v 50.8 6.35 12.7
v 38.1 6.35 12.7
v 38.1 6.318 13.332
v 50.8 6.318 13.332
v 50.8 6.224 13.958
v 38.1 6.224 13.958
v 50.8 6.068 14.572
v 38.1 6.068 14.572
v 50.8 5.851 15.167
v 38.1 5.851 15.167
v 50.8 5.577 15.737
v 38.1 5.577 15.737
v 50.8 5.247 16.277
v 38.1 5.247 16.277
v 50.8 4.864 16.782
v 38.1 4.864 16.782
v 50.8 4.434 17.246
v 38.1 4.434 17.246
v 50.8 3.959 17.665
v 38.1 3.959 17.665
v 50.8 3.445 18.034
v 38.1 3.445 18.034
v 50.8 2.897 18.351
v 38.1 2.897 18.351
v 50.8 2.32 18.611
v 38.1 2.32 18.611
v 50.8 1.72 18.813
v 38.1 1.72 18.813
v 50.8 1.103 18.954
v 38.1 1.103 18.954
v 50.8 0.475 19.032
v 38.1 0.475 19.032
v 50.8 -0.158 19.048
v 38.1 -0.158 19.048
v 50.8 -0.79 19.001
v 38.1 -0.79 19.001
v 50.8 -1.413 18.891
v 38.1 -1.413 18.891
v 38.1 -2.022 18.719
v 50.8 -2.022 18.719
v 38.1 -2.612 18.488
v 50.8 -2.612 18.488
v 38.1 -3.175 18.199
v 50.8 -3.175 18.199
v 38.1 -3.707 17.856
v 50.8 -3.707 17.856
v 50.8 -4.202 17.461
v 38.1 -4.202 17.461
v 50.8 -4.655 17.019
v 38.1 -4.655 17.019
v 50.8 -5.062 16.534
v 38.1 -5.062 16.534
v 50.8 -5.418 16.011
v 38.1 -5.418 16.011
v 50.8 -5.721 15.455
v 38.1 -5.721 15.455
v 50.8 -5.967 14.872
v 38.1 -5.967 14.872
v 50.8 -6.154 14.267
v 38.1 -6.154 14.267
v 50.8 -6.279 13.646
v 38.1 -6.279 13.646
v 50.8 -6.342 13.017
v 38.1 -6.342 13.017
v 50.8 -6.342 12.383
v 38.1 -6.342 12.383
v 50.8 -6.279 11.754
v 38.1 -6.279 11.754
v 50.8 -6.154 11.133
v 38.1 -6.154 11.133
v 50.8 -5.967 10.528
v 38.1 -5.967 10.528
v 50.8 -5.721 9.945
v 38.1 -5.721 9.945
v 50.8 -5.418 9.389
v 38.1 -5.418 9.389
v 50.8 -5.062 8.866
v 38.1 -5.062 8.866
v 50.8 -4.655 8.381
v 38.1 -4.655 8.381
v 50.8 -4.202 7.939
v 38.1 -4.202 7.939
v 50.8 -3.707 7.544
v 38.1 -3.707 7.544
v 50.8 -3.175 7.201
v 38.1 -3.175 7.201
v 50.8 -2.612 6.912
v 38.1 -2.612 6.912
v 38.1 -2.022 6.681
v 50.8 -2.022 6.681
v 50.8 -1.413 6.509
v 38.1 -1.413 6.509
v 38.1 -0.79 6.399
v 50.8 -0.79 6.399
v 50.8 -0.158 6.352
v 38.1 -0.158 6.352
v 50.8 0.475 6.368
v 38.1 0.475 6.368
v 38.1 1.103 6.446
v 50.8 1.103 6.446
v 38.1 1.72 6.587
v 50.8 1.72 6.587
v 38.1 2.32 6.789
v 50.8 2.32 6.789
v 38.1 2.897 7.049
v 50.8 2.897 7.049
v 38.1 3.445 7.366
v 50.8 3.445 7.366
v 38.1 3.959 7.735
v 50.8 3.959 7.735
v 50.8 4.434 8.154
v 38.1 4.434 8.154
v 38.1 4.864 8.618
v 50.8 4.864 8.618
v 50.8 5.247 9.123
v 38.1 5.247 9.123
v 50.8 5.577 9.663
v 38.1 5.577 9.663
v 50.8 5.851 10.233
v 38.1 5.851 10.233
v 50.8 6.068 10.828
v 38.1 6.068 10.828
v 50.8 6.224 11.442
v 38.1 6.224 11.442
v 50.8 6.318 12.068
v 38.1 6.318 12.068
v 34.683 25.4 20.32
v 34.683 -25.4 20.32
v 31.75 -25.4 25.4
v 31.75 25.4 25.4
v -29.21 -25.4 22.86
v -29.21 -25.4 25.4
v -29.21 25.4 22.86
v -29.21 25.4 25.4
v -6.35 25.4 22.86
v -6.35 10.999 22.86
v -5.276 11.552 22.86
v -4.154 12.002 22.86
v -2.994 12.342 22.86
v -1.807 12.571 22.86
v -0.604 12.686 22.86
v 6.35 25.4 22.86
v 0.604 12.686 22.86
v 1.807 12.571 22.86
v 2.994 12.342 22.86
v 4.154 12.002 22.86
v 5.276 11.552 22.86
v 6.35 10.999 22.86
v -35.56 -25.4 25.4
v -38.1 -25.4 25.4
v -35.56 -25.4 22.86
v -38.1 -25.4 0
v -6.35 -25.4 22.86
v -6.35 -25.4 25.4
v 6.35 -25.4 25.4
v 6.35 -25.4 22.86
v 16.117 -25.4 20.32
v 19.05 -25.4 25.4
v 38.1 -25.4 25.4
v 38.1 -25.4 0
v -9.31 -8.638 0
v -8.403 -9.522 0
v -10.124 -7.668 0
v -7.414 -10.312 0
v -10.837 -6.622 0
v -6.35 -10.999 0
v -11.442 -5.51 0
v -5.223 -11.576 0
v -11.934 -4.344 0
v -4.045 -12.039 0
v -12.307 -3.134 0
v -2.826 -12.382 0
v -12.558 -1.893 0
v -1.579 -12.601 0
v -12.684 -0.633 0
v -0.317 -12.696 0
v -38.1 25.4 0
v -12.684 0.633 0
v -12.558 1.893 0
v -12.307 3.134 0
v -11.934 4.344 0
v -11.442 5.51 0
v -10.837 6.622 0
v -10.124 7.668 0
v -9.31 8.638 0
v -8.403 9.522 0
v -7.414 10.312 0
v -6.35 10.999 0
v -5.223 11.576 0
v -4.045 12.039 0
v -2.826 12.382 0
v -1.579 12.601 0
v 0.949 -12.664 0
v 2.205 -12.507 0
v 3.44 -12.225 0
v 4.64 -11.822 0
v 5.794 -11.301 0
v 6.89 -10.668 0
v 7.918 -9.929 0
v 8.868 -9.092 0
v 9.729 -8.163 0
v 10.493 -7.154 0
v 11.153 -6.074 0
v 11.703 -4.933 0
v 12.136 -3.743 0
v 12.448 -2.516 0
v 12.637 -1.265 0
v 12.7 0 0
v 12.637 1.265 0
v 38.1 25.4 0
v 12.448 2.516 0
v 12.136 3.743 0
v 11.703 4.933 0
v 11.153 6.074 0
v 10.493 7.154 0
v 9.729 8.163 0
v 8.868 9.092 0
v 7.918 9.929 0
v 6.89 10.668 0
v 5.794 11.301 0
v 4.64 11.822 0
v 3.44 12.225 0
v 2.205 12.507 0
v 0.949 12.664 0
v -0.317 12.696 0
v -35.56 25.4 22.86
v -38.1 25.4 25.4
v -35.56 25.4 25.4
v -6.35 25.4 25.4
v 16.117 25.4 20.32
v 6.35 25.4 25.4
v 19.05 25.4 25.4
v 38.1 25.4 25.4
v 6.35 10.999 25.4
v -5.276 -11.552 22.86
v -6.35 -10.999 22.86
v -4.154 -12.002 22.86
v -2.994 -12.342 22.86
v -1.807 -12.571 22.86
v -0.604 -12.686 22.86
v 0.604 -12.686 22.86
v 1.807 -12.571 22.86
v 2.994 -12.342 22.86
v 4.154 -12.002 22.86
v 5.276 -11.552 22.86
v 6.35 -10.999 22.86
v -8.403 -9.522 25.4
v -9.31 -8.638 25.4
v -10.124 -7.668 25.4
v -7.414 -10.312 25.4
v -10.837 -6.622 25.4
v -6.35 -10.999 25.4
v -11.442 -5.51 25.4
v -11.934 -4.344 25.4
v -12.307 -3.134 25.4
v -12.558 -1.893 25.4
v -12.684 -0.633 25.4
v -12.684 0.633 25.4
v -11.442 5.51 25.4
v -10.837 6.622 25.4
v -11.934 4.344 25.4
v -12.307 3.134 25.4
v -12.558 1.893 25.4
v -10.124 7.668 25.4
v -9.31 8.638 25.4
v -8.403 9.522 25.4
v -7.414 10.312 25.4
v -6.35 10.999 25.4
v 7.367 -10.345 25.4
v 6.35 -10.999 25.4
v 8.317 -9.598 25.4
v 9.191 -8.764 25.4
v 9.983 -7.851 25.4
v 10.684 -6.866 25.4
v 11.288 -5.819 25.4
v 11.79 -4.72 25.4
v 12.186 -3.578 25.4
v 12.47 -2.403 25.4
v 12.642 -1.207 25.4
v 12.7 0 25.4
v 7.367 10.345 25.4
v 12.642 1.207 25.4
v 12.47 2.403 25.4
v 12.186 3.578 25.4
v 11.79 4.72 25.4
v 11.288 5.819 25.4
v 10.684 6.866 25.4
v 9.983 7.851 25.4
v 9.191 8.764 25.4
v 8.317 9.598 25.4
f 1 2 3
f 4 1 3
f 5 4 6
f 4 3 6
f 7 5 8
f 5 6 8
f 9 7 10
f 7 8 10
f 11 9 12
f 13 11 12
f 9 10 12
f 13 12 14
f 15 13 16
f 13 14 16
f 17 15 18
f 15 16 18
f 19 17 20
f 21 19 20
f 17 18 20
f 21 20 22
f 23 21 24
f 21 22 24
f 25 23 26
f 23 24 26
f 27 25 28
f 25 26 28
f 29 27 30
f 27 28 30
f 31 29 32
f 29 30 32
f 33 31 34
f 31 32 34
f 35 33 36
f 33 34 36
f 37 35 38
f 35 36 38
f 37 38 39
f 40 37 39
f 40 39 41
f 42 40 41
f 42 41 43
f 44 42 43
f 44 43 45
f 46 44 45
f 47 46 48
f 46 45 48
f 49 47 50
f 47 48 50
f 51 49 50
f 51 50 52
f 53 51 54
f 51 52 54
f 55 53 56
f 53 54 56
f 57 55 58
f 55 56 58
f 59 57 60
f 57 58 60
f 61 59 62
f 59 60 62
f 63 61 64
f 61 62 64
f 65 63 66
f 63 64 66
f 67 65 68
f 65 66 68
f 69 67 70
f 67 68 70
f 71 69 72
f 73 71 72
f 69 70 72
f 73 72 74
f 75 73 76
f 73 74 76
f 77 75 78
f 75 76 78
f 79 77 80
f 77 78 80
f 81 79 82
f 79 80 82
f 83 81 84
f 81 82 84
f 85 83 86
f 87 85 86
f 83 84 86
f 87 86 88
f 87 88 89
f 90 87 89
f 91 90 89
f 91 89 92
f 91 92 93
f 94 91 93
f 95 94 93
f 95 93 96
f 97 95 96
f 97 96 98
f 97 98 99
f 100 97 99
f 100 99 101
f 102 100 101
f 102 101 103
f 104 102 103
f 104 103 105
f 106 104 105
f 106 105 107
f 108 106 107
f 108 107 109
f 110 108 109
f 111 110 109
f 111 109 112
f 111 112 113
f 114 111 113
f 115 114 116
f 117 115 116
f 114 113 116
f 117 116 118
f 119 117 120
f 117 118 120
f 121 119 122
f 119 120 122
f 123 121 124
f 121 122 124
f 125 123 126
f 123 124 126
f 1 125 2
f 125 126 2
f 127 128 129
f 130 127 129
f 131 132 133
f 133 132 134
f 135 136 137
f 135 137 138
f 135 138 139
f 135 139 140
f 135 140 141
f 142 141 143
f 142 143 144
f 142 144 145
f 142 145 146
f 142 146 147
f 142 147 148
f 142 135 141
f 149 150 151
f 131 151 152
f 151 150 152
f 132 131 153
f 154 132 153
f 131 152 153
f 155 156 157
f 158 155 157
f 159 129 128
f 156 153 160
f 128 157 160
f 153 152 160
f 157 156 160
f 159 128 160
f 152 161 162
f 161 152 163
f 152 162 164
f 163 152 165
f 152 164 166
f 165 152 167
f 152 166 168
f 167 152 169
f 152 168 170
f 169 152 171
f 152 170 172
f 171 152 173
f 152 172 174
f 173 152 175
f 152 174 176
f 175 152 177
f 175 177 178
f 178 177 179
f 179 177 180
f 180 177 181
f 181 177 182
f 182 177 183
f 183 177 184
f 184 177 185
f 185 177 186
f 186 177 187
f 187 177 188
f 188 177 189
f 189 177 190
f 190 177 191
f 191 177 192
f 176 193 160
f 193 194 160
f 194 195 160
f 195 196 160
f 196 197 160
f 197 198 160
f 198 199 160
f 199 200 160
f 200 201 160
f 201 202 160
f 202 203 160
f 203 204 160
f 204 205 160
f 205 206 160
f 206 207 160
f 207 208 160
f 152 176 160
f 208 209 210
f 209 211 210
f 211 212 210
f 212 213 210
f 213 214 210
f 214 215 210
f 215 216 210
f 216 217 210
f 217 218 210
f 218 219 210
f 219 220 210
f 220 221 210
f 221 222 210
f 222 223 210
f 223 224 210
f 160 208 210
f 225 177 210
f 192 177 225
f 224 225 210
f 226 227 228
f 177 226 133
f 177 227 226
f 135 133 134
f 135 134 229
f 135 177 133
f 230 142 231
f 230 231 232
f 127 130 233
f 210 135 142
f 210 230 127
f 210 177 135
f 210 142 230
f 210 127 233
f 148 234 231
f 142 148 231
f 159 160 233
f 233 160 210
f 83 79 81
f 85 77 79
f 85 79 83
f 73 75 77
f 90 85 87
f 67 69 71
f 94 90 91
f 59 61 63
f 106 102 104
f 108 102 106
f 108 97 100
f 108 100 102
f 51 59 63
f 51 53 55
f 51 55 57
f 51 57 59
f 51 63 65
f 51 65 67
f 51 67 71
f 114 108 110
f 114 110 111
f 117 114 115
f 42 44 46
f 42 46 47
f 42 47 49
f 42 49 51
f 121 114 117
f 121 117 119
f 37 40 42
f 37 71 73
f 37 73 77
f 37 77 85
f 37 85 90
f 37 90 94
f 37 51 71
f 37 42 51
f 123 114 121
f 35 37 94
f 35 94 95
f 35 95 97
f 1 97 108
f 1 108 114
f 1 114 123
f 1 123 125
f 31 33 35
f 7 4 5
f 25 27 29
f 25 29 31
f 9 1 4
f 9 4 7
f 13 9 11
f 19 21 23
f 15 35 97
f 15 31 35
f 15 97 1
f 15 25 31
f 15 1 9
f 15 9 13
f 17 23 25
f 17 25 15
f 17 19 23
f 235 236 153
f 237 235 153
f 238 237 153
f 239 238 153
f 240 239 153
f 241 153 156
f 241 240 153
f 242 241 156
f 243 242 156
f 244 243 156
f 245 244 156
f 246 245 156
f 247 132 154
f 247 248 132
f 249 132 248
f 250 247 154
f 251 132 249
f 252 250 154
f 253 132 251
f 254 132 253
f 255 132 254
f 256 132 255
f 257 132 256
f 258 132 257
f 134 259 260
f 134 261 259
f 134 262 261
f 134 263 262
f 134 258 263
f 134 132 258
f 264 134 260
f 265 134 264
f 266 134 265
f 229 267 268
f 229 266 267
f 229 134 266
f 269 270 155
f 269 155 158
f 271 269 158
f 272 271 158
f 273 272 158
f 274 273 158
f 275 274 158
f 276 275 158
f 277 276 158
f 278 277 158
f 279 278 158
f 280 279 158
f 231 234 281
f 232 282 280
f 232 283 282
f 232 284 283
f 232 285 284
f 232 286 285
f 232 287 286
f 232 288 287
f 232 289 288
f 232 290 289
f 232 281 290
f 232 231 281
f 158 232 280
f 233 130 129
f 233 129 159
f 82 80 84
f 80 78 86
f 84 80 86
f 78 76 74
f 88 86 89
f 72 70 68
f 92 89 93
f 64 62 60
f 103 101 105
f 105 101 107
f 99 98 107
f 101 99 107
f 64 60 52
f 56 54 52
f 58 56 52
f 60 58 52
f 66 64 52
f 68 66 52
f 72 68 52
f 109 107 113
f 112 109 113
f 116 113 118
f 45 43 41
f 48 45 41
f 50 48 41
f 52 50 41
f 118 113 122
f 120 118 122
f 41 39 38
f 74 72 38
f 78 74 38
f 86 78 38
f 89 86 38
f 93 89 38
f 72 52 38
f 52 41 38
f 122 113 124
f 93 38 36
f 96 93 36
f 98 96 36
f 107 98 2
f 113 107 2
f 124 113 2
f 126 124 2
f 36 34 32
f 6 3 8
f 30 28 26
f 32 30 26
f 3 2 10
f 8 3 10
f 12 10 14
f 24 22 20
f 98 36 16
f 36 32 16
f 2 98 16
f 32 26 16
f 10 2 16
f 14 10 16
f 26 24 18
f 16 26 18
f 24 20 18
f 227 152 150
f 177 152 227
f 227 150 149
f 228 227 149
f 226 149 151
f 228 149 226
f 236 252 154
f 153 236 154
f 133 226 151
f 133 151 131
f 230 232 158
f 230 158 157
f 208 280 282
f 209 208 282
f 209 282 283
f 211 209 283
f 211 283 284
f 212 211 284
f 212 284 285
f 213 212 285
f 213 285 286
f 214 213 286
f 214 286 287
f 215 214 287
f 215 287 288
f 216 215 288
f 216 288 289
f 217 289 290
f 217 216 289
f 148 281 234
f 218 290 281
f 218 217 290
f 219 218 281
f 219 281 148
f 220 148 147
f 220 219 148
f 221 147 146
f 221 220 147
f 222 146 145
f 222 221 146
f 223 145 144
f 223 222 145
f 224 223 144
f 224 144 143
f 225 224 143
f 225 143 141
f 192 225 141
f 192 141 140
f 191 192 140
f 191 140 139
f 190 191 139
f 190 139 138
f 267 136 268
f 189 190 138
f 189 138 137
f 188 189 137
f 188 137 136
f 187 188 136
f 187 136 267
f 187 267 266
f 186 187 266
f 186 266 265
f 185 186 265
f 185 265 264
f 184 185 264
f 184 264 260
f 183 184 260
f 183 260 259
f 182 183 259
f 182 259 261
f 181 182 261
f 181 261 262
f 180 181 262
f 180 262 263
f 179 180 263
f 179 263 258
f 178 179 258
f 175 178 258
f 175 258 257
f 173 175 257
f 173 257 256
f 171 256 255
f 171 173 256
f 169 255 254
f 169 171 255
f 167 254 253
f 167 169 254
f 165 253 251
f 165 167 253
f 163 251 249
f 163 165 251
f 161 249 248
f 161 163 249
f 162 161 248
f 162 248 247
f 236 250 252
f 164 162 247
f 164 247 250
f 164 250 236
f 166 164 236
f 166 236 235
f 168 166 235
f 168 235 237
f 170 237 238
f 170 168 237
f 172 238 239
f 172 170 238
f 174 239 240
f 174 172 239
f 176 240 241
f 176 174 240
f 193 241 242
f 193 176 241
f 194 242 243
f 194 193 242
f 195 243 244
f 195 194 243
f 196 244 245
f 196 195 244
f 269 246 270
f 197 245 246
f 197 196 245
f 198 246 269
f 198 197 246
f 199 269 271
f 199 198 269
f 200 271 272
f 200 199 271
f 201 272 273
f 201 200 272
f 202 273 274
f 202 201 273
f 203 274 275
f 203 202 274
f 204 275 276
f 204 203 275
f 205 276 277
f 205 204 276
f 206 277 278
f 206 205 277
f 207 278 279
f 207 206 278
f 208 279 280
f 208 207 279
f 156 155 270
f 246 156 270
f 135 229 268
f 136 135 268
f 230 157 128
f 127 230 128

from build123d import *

# Parameters (mm, degrees)
F0_W     = 76.2
F0_H     = 50.8
F0_R     = 12.7
F1_DEPTH = 25.4
F2_W     = 6.35
F2_H     = 50.8
F3_DEPTH = 2.54
F5_DEPTH = 50.801
F6_R     = 6.35
F7_DEPTH = 12.7


with BuildPart() as f1:
    # F0 (on Top) → F1 (new body)
    with BuildSketch(Plane.XY):
        Rectangle(F0_W, F0_H)
        Circle(F0_R, mode=Mode.SUBTRACT)
    extrude(amount=F1_DEPTH)

    # F2 (on face) → F3 (cut)
    with BuildSketch(Plane.XY.offset(25.4)):
        with Locations((-32.385, 0)):
            Rectangle(F2_W, F2_H)
        with BuildLine():
            Line((6.35, 25.4), (-6.35, 25.4))
            Line((-6.35, 25.4), (-6.35, 10.9985226281))
            ThreePointArc((-6.35, 10.9985226281), (0, 12.7), (6.35, 10.9985226281))
            Line((6.35, 10.9985226281), (6.35, 25.4))
        make_face()
        with BuildLine():
            Line((-6.35, -10.9985226281), (-6.35, -25.4))
            Line((-6.35, -25.4), (6.35, -25.4))
            Line((6.35, -25.4), (6.35, -10.9985226281))
            ThreePointArc((6.35, -10.9985226281), (0, -12.7), (-6.35, -10.9985226281))
        make_face()
    extrude(amount=-F3_DEPTH, mode=Mode.SUBTRACT)

    # F4 (on face) → F5 (cut, through all)
    with BuildSketch(Plane.XZ.offset(25.4)):
        Polygon((31.75, 25.4), (19.05, 25.4), (16.1170606325, 20.32), (34.6829393675, 20.32), align=None)
    extrude(amount=-F5_DEPTH, mode=Mode.SUBTRACT)


with BuildPart() as f7:
    # F6 (on face) → F7 (new body)
    with BuildSketch(Plane.YZ.offset(38.1)):
        with Locations((0, 12.7)):
            Circle(F6_R)
    extrude(amount=F7_DEPTH)


solid = Compound([f1.part, f7.part])
